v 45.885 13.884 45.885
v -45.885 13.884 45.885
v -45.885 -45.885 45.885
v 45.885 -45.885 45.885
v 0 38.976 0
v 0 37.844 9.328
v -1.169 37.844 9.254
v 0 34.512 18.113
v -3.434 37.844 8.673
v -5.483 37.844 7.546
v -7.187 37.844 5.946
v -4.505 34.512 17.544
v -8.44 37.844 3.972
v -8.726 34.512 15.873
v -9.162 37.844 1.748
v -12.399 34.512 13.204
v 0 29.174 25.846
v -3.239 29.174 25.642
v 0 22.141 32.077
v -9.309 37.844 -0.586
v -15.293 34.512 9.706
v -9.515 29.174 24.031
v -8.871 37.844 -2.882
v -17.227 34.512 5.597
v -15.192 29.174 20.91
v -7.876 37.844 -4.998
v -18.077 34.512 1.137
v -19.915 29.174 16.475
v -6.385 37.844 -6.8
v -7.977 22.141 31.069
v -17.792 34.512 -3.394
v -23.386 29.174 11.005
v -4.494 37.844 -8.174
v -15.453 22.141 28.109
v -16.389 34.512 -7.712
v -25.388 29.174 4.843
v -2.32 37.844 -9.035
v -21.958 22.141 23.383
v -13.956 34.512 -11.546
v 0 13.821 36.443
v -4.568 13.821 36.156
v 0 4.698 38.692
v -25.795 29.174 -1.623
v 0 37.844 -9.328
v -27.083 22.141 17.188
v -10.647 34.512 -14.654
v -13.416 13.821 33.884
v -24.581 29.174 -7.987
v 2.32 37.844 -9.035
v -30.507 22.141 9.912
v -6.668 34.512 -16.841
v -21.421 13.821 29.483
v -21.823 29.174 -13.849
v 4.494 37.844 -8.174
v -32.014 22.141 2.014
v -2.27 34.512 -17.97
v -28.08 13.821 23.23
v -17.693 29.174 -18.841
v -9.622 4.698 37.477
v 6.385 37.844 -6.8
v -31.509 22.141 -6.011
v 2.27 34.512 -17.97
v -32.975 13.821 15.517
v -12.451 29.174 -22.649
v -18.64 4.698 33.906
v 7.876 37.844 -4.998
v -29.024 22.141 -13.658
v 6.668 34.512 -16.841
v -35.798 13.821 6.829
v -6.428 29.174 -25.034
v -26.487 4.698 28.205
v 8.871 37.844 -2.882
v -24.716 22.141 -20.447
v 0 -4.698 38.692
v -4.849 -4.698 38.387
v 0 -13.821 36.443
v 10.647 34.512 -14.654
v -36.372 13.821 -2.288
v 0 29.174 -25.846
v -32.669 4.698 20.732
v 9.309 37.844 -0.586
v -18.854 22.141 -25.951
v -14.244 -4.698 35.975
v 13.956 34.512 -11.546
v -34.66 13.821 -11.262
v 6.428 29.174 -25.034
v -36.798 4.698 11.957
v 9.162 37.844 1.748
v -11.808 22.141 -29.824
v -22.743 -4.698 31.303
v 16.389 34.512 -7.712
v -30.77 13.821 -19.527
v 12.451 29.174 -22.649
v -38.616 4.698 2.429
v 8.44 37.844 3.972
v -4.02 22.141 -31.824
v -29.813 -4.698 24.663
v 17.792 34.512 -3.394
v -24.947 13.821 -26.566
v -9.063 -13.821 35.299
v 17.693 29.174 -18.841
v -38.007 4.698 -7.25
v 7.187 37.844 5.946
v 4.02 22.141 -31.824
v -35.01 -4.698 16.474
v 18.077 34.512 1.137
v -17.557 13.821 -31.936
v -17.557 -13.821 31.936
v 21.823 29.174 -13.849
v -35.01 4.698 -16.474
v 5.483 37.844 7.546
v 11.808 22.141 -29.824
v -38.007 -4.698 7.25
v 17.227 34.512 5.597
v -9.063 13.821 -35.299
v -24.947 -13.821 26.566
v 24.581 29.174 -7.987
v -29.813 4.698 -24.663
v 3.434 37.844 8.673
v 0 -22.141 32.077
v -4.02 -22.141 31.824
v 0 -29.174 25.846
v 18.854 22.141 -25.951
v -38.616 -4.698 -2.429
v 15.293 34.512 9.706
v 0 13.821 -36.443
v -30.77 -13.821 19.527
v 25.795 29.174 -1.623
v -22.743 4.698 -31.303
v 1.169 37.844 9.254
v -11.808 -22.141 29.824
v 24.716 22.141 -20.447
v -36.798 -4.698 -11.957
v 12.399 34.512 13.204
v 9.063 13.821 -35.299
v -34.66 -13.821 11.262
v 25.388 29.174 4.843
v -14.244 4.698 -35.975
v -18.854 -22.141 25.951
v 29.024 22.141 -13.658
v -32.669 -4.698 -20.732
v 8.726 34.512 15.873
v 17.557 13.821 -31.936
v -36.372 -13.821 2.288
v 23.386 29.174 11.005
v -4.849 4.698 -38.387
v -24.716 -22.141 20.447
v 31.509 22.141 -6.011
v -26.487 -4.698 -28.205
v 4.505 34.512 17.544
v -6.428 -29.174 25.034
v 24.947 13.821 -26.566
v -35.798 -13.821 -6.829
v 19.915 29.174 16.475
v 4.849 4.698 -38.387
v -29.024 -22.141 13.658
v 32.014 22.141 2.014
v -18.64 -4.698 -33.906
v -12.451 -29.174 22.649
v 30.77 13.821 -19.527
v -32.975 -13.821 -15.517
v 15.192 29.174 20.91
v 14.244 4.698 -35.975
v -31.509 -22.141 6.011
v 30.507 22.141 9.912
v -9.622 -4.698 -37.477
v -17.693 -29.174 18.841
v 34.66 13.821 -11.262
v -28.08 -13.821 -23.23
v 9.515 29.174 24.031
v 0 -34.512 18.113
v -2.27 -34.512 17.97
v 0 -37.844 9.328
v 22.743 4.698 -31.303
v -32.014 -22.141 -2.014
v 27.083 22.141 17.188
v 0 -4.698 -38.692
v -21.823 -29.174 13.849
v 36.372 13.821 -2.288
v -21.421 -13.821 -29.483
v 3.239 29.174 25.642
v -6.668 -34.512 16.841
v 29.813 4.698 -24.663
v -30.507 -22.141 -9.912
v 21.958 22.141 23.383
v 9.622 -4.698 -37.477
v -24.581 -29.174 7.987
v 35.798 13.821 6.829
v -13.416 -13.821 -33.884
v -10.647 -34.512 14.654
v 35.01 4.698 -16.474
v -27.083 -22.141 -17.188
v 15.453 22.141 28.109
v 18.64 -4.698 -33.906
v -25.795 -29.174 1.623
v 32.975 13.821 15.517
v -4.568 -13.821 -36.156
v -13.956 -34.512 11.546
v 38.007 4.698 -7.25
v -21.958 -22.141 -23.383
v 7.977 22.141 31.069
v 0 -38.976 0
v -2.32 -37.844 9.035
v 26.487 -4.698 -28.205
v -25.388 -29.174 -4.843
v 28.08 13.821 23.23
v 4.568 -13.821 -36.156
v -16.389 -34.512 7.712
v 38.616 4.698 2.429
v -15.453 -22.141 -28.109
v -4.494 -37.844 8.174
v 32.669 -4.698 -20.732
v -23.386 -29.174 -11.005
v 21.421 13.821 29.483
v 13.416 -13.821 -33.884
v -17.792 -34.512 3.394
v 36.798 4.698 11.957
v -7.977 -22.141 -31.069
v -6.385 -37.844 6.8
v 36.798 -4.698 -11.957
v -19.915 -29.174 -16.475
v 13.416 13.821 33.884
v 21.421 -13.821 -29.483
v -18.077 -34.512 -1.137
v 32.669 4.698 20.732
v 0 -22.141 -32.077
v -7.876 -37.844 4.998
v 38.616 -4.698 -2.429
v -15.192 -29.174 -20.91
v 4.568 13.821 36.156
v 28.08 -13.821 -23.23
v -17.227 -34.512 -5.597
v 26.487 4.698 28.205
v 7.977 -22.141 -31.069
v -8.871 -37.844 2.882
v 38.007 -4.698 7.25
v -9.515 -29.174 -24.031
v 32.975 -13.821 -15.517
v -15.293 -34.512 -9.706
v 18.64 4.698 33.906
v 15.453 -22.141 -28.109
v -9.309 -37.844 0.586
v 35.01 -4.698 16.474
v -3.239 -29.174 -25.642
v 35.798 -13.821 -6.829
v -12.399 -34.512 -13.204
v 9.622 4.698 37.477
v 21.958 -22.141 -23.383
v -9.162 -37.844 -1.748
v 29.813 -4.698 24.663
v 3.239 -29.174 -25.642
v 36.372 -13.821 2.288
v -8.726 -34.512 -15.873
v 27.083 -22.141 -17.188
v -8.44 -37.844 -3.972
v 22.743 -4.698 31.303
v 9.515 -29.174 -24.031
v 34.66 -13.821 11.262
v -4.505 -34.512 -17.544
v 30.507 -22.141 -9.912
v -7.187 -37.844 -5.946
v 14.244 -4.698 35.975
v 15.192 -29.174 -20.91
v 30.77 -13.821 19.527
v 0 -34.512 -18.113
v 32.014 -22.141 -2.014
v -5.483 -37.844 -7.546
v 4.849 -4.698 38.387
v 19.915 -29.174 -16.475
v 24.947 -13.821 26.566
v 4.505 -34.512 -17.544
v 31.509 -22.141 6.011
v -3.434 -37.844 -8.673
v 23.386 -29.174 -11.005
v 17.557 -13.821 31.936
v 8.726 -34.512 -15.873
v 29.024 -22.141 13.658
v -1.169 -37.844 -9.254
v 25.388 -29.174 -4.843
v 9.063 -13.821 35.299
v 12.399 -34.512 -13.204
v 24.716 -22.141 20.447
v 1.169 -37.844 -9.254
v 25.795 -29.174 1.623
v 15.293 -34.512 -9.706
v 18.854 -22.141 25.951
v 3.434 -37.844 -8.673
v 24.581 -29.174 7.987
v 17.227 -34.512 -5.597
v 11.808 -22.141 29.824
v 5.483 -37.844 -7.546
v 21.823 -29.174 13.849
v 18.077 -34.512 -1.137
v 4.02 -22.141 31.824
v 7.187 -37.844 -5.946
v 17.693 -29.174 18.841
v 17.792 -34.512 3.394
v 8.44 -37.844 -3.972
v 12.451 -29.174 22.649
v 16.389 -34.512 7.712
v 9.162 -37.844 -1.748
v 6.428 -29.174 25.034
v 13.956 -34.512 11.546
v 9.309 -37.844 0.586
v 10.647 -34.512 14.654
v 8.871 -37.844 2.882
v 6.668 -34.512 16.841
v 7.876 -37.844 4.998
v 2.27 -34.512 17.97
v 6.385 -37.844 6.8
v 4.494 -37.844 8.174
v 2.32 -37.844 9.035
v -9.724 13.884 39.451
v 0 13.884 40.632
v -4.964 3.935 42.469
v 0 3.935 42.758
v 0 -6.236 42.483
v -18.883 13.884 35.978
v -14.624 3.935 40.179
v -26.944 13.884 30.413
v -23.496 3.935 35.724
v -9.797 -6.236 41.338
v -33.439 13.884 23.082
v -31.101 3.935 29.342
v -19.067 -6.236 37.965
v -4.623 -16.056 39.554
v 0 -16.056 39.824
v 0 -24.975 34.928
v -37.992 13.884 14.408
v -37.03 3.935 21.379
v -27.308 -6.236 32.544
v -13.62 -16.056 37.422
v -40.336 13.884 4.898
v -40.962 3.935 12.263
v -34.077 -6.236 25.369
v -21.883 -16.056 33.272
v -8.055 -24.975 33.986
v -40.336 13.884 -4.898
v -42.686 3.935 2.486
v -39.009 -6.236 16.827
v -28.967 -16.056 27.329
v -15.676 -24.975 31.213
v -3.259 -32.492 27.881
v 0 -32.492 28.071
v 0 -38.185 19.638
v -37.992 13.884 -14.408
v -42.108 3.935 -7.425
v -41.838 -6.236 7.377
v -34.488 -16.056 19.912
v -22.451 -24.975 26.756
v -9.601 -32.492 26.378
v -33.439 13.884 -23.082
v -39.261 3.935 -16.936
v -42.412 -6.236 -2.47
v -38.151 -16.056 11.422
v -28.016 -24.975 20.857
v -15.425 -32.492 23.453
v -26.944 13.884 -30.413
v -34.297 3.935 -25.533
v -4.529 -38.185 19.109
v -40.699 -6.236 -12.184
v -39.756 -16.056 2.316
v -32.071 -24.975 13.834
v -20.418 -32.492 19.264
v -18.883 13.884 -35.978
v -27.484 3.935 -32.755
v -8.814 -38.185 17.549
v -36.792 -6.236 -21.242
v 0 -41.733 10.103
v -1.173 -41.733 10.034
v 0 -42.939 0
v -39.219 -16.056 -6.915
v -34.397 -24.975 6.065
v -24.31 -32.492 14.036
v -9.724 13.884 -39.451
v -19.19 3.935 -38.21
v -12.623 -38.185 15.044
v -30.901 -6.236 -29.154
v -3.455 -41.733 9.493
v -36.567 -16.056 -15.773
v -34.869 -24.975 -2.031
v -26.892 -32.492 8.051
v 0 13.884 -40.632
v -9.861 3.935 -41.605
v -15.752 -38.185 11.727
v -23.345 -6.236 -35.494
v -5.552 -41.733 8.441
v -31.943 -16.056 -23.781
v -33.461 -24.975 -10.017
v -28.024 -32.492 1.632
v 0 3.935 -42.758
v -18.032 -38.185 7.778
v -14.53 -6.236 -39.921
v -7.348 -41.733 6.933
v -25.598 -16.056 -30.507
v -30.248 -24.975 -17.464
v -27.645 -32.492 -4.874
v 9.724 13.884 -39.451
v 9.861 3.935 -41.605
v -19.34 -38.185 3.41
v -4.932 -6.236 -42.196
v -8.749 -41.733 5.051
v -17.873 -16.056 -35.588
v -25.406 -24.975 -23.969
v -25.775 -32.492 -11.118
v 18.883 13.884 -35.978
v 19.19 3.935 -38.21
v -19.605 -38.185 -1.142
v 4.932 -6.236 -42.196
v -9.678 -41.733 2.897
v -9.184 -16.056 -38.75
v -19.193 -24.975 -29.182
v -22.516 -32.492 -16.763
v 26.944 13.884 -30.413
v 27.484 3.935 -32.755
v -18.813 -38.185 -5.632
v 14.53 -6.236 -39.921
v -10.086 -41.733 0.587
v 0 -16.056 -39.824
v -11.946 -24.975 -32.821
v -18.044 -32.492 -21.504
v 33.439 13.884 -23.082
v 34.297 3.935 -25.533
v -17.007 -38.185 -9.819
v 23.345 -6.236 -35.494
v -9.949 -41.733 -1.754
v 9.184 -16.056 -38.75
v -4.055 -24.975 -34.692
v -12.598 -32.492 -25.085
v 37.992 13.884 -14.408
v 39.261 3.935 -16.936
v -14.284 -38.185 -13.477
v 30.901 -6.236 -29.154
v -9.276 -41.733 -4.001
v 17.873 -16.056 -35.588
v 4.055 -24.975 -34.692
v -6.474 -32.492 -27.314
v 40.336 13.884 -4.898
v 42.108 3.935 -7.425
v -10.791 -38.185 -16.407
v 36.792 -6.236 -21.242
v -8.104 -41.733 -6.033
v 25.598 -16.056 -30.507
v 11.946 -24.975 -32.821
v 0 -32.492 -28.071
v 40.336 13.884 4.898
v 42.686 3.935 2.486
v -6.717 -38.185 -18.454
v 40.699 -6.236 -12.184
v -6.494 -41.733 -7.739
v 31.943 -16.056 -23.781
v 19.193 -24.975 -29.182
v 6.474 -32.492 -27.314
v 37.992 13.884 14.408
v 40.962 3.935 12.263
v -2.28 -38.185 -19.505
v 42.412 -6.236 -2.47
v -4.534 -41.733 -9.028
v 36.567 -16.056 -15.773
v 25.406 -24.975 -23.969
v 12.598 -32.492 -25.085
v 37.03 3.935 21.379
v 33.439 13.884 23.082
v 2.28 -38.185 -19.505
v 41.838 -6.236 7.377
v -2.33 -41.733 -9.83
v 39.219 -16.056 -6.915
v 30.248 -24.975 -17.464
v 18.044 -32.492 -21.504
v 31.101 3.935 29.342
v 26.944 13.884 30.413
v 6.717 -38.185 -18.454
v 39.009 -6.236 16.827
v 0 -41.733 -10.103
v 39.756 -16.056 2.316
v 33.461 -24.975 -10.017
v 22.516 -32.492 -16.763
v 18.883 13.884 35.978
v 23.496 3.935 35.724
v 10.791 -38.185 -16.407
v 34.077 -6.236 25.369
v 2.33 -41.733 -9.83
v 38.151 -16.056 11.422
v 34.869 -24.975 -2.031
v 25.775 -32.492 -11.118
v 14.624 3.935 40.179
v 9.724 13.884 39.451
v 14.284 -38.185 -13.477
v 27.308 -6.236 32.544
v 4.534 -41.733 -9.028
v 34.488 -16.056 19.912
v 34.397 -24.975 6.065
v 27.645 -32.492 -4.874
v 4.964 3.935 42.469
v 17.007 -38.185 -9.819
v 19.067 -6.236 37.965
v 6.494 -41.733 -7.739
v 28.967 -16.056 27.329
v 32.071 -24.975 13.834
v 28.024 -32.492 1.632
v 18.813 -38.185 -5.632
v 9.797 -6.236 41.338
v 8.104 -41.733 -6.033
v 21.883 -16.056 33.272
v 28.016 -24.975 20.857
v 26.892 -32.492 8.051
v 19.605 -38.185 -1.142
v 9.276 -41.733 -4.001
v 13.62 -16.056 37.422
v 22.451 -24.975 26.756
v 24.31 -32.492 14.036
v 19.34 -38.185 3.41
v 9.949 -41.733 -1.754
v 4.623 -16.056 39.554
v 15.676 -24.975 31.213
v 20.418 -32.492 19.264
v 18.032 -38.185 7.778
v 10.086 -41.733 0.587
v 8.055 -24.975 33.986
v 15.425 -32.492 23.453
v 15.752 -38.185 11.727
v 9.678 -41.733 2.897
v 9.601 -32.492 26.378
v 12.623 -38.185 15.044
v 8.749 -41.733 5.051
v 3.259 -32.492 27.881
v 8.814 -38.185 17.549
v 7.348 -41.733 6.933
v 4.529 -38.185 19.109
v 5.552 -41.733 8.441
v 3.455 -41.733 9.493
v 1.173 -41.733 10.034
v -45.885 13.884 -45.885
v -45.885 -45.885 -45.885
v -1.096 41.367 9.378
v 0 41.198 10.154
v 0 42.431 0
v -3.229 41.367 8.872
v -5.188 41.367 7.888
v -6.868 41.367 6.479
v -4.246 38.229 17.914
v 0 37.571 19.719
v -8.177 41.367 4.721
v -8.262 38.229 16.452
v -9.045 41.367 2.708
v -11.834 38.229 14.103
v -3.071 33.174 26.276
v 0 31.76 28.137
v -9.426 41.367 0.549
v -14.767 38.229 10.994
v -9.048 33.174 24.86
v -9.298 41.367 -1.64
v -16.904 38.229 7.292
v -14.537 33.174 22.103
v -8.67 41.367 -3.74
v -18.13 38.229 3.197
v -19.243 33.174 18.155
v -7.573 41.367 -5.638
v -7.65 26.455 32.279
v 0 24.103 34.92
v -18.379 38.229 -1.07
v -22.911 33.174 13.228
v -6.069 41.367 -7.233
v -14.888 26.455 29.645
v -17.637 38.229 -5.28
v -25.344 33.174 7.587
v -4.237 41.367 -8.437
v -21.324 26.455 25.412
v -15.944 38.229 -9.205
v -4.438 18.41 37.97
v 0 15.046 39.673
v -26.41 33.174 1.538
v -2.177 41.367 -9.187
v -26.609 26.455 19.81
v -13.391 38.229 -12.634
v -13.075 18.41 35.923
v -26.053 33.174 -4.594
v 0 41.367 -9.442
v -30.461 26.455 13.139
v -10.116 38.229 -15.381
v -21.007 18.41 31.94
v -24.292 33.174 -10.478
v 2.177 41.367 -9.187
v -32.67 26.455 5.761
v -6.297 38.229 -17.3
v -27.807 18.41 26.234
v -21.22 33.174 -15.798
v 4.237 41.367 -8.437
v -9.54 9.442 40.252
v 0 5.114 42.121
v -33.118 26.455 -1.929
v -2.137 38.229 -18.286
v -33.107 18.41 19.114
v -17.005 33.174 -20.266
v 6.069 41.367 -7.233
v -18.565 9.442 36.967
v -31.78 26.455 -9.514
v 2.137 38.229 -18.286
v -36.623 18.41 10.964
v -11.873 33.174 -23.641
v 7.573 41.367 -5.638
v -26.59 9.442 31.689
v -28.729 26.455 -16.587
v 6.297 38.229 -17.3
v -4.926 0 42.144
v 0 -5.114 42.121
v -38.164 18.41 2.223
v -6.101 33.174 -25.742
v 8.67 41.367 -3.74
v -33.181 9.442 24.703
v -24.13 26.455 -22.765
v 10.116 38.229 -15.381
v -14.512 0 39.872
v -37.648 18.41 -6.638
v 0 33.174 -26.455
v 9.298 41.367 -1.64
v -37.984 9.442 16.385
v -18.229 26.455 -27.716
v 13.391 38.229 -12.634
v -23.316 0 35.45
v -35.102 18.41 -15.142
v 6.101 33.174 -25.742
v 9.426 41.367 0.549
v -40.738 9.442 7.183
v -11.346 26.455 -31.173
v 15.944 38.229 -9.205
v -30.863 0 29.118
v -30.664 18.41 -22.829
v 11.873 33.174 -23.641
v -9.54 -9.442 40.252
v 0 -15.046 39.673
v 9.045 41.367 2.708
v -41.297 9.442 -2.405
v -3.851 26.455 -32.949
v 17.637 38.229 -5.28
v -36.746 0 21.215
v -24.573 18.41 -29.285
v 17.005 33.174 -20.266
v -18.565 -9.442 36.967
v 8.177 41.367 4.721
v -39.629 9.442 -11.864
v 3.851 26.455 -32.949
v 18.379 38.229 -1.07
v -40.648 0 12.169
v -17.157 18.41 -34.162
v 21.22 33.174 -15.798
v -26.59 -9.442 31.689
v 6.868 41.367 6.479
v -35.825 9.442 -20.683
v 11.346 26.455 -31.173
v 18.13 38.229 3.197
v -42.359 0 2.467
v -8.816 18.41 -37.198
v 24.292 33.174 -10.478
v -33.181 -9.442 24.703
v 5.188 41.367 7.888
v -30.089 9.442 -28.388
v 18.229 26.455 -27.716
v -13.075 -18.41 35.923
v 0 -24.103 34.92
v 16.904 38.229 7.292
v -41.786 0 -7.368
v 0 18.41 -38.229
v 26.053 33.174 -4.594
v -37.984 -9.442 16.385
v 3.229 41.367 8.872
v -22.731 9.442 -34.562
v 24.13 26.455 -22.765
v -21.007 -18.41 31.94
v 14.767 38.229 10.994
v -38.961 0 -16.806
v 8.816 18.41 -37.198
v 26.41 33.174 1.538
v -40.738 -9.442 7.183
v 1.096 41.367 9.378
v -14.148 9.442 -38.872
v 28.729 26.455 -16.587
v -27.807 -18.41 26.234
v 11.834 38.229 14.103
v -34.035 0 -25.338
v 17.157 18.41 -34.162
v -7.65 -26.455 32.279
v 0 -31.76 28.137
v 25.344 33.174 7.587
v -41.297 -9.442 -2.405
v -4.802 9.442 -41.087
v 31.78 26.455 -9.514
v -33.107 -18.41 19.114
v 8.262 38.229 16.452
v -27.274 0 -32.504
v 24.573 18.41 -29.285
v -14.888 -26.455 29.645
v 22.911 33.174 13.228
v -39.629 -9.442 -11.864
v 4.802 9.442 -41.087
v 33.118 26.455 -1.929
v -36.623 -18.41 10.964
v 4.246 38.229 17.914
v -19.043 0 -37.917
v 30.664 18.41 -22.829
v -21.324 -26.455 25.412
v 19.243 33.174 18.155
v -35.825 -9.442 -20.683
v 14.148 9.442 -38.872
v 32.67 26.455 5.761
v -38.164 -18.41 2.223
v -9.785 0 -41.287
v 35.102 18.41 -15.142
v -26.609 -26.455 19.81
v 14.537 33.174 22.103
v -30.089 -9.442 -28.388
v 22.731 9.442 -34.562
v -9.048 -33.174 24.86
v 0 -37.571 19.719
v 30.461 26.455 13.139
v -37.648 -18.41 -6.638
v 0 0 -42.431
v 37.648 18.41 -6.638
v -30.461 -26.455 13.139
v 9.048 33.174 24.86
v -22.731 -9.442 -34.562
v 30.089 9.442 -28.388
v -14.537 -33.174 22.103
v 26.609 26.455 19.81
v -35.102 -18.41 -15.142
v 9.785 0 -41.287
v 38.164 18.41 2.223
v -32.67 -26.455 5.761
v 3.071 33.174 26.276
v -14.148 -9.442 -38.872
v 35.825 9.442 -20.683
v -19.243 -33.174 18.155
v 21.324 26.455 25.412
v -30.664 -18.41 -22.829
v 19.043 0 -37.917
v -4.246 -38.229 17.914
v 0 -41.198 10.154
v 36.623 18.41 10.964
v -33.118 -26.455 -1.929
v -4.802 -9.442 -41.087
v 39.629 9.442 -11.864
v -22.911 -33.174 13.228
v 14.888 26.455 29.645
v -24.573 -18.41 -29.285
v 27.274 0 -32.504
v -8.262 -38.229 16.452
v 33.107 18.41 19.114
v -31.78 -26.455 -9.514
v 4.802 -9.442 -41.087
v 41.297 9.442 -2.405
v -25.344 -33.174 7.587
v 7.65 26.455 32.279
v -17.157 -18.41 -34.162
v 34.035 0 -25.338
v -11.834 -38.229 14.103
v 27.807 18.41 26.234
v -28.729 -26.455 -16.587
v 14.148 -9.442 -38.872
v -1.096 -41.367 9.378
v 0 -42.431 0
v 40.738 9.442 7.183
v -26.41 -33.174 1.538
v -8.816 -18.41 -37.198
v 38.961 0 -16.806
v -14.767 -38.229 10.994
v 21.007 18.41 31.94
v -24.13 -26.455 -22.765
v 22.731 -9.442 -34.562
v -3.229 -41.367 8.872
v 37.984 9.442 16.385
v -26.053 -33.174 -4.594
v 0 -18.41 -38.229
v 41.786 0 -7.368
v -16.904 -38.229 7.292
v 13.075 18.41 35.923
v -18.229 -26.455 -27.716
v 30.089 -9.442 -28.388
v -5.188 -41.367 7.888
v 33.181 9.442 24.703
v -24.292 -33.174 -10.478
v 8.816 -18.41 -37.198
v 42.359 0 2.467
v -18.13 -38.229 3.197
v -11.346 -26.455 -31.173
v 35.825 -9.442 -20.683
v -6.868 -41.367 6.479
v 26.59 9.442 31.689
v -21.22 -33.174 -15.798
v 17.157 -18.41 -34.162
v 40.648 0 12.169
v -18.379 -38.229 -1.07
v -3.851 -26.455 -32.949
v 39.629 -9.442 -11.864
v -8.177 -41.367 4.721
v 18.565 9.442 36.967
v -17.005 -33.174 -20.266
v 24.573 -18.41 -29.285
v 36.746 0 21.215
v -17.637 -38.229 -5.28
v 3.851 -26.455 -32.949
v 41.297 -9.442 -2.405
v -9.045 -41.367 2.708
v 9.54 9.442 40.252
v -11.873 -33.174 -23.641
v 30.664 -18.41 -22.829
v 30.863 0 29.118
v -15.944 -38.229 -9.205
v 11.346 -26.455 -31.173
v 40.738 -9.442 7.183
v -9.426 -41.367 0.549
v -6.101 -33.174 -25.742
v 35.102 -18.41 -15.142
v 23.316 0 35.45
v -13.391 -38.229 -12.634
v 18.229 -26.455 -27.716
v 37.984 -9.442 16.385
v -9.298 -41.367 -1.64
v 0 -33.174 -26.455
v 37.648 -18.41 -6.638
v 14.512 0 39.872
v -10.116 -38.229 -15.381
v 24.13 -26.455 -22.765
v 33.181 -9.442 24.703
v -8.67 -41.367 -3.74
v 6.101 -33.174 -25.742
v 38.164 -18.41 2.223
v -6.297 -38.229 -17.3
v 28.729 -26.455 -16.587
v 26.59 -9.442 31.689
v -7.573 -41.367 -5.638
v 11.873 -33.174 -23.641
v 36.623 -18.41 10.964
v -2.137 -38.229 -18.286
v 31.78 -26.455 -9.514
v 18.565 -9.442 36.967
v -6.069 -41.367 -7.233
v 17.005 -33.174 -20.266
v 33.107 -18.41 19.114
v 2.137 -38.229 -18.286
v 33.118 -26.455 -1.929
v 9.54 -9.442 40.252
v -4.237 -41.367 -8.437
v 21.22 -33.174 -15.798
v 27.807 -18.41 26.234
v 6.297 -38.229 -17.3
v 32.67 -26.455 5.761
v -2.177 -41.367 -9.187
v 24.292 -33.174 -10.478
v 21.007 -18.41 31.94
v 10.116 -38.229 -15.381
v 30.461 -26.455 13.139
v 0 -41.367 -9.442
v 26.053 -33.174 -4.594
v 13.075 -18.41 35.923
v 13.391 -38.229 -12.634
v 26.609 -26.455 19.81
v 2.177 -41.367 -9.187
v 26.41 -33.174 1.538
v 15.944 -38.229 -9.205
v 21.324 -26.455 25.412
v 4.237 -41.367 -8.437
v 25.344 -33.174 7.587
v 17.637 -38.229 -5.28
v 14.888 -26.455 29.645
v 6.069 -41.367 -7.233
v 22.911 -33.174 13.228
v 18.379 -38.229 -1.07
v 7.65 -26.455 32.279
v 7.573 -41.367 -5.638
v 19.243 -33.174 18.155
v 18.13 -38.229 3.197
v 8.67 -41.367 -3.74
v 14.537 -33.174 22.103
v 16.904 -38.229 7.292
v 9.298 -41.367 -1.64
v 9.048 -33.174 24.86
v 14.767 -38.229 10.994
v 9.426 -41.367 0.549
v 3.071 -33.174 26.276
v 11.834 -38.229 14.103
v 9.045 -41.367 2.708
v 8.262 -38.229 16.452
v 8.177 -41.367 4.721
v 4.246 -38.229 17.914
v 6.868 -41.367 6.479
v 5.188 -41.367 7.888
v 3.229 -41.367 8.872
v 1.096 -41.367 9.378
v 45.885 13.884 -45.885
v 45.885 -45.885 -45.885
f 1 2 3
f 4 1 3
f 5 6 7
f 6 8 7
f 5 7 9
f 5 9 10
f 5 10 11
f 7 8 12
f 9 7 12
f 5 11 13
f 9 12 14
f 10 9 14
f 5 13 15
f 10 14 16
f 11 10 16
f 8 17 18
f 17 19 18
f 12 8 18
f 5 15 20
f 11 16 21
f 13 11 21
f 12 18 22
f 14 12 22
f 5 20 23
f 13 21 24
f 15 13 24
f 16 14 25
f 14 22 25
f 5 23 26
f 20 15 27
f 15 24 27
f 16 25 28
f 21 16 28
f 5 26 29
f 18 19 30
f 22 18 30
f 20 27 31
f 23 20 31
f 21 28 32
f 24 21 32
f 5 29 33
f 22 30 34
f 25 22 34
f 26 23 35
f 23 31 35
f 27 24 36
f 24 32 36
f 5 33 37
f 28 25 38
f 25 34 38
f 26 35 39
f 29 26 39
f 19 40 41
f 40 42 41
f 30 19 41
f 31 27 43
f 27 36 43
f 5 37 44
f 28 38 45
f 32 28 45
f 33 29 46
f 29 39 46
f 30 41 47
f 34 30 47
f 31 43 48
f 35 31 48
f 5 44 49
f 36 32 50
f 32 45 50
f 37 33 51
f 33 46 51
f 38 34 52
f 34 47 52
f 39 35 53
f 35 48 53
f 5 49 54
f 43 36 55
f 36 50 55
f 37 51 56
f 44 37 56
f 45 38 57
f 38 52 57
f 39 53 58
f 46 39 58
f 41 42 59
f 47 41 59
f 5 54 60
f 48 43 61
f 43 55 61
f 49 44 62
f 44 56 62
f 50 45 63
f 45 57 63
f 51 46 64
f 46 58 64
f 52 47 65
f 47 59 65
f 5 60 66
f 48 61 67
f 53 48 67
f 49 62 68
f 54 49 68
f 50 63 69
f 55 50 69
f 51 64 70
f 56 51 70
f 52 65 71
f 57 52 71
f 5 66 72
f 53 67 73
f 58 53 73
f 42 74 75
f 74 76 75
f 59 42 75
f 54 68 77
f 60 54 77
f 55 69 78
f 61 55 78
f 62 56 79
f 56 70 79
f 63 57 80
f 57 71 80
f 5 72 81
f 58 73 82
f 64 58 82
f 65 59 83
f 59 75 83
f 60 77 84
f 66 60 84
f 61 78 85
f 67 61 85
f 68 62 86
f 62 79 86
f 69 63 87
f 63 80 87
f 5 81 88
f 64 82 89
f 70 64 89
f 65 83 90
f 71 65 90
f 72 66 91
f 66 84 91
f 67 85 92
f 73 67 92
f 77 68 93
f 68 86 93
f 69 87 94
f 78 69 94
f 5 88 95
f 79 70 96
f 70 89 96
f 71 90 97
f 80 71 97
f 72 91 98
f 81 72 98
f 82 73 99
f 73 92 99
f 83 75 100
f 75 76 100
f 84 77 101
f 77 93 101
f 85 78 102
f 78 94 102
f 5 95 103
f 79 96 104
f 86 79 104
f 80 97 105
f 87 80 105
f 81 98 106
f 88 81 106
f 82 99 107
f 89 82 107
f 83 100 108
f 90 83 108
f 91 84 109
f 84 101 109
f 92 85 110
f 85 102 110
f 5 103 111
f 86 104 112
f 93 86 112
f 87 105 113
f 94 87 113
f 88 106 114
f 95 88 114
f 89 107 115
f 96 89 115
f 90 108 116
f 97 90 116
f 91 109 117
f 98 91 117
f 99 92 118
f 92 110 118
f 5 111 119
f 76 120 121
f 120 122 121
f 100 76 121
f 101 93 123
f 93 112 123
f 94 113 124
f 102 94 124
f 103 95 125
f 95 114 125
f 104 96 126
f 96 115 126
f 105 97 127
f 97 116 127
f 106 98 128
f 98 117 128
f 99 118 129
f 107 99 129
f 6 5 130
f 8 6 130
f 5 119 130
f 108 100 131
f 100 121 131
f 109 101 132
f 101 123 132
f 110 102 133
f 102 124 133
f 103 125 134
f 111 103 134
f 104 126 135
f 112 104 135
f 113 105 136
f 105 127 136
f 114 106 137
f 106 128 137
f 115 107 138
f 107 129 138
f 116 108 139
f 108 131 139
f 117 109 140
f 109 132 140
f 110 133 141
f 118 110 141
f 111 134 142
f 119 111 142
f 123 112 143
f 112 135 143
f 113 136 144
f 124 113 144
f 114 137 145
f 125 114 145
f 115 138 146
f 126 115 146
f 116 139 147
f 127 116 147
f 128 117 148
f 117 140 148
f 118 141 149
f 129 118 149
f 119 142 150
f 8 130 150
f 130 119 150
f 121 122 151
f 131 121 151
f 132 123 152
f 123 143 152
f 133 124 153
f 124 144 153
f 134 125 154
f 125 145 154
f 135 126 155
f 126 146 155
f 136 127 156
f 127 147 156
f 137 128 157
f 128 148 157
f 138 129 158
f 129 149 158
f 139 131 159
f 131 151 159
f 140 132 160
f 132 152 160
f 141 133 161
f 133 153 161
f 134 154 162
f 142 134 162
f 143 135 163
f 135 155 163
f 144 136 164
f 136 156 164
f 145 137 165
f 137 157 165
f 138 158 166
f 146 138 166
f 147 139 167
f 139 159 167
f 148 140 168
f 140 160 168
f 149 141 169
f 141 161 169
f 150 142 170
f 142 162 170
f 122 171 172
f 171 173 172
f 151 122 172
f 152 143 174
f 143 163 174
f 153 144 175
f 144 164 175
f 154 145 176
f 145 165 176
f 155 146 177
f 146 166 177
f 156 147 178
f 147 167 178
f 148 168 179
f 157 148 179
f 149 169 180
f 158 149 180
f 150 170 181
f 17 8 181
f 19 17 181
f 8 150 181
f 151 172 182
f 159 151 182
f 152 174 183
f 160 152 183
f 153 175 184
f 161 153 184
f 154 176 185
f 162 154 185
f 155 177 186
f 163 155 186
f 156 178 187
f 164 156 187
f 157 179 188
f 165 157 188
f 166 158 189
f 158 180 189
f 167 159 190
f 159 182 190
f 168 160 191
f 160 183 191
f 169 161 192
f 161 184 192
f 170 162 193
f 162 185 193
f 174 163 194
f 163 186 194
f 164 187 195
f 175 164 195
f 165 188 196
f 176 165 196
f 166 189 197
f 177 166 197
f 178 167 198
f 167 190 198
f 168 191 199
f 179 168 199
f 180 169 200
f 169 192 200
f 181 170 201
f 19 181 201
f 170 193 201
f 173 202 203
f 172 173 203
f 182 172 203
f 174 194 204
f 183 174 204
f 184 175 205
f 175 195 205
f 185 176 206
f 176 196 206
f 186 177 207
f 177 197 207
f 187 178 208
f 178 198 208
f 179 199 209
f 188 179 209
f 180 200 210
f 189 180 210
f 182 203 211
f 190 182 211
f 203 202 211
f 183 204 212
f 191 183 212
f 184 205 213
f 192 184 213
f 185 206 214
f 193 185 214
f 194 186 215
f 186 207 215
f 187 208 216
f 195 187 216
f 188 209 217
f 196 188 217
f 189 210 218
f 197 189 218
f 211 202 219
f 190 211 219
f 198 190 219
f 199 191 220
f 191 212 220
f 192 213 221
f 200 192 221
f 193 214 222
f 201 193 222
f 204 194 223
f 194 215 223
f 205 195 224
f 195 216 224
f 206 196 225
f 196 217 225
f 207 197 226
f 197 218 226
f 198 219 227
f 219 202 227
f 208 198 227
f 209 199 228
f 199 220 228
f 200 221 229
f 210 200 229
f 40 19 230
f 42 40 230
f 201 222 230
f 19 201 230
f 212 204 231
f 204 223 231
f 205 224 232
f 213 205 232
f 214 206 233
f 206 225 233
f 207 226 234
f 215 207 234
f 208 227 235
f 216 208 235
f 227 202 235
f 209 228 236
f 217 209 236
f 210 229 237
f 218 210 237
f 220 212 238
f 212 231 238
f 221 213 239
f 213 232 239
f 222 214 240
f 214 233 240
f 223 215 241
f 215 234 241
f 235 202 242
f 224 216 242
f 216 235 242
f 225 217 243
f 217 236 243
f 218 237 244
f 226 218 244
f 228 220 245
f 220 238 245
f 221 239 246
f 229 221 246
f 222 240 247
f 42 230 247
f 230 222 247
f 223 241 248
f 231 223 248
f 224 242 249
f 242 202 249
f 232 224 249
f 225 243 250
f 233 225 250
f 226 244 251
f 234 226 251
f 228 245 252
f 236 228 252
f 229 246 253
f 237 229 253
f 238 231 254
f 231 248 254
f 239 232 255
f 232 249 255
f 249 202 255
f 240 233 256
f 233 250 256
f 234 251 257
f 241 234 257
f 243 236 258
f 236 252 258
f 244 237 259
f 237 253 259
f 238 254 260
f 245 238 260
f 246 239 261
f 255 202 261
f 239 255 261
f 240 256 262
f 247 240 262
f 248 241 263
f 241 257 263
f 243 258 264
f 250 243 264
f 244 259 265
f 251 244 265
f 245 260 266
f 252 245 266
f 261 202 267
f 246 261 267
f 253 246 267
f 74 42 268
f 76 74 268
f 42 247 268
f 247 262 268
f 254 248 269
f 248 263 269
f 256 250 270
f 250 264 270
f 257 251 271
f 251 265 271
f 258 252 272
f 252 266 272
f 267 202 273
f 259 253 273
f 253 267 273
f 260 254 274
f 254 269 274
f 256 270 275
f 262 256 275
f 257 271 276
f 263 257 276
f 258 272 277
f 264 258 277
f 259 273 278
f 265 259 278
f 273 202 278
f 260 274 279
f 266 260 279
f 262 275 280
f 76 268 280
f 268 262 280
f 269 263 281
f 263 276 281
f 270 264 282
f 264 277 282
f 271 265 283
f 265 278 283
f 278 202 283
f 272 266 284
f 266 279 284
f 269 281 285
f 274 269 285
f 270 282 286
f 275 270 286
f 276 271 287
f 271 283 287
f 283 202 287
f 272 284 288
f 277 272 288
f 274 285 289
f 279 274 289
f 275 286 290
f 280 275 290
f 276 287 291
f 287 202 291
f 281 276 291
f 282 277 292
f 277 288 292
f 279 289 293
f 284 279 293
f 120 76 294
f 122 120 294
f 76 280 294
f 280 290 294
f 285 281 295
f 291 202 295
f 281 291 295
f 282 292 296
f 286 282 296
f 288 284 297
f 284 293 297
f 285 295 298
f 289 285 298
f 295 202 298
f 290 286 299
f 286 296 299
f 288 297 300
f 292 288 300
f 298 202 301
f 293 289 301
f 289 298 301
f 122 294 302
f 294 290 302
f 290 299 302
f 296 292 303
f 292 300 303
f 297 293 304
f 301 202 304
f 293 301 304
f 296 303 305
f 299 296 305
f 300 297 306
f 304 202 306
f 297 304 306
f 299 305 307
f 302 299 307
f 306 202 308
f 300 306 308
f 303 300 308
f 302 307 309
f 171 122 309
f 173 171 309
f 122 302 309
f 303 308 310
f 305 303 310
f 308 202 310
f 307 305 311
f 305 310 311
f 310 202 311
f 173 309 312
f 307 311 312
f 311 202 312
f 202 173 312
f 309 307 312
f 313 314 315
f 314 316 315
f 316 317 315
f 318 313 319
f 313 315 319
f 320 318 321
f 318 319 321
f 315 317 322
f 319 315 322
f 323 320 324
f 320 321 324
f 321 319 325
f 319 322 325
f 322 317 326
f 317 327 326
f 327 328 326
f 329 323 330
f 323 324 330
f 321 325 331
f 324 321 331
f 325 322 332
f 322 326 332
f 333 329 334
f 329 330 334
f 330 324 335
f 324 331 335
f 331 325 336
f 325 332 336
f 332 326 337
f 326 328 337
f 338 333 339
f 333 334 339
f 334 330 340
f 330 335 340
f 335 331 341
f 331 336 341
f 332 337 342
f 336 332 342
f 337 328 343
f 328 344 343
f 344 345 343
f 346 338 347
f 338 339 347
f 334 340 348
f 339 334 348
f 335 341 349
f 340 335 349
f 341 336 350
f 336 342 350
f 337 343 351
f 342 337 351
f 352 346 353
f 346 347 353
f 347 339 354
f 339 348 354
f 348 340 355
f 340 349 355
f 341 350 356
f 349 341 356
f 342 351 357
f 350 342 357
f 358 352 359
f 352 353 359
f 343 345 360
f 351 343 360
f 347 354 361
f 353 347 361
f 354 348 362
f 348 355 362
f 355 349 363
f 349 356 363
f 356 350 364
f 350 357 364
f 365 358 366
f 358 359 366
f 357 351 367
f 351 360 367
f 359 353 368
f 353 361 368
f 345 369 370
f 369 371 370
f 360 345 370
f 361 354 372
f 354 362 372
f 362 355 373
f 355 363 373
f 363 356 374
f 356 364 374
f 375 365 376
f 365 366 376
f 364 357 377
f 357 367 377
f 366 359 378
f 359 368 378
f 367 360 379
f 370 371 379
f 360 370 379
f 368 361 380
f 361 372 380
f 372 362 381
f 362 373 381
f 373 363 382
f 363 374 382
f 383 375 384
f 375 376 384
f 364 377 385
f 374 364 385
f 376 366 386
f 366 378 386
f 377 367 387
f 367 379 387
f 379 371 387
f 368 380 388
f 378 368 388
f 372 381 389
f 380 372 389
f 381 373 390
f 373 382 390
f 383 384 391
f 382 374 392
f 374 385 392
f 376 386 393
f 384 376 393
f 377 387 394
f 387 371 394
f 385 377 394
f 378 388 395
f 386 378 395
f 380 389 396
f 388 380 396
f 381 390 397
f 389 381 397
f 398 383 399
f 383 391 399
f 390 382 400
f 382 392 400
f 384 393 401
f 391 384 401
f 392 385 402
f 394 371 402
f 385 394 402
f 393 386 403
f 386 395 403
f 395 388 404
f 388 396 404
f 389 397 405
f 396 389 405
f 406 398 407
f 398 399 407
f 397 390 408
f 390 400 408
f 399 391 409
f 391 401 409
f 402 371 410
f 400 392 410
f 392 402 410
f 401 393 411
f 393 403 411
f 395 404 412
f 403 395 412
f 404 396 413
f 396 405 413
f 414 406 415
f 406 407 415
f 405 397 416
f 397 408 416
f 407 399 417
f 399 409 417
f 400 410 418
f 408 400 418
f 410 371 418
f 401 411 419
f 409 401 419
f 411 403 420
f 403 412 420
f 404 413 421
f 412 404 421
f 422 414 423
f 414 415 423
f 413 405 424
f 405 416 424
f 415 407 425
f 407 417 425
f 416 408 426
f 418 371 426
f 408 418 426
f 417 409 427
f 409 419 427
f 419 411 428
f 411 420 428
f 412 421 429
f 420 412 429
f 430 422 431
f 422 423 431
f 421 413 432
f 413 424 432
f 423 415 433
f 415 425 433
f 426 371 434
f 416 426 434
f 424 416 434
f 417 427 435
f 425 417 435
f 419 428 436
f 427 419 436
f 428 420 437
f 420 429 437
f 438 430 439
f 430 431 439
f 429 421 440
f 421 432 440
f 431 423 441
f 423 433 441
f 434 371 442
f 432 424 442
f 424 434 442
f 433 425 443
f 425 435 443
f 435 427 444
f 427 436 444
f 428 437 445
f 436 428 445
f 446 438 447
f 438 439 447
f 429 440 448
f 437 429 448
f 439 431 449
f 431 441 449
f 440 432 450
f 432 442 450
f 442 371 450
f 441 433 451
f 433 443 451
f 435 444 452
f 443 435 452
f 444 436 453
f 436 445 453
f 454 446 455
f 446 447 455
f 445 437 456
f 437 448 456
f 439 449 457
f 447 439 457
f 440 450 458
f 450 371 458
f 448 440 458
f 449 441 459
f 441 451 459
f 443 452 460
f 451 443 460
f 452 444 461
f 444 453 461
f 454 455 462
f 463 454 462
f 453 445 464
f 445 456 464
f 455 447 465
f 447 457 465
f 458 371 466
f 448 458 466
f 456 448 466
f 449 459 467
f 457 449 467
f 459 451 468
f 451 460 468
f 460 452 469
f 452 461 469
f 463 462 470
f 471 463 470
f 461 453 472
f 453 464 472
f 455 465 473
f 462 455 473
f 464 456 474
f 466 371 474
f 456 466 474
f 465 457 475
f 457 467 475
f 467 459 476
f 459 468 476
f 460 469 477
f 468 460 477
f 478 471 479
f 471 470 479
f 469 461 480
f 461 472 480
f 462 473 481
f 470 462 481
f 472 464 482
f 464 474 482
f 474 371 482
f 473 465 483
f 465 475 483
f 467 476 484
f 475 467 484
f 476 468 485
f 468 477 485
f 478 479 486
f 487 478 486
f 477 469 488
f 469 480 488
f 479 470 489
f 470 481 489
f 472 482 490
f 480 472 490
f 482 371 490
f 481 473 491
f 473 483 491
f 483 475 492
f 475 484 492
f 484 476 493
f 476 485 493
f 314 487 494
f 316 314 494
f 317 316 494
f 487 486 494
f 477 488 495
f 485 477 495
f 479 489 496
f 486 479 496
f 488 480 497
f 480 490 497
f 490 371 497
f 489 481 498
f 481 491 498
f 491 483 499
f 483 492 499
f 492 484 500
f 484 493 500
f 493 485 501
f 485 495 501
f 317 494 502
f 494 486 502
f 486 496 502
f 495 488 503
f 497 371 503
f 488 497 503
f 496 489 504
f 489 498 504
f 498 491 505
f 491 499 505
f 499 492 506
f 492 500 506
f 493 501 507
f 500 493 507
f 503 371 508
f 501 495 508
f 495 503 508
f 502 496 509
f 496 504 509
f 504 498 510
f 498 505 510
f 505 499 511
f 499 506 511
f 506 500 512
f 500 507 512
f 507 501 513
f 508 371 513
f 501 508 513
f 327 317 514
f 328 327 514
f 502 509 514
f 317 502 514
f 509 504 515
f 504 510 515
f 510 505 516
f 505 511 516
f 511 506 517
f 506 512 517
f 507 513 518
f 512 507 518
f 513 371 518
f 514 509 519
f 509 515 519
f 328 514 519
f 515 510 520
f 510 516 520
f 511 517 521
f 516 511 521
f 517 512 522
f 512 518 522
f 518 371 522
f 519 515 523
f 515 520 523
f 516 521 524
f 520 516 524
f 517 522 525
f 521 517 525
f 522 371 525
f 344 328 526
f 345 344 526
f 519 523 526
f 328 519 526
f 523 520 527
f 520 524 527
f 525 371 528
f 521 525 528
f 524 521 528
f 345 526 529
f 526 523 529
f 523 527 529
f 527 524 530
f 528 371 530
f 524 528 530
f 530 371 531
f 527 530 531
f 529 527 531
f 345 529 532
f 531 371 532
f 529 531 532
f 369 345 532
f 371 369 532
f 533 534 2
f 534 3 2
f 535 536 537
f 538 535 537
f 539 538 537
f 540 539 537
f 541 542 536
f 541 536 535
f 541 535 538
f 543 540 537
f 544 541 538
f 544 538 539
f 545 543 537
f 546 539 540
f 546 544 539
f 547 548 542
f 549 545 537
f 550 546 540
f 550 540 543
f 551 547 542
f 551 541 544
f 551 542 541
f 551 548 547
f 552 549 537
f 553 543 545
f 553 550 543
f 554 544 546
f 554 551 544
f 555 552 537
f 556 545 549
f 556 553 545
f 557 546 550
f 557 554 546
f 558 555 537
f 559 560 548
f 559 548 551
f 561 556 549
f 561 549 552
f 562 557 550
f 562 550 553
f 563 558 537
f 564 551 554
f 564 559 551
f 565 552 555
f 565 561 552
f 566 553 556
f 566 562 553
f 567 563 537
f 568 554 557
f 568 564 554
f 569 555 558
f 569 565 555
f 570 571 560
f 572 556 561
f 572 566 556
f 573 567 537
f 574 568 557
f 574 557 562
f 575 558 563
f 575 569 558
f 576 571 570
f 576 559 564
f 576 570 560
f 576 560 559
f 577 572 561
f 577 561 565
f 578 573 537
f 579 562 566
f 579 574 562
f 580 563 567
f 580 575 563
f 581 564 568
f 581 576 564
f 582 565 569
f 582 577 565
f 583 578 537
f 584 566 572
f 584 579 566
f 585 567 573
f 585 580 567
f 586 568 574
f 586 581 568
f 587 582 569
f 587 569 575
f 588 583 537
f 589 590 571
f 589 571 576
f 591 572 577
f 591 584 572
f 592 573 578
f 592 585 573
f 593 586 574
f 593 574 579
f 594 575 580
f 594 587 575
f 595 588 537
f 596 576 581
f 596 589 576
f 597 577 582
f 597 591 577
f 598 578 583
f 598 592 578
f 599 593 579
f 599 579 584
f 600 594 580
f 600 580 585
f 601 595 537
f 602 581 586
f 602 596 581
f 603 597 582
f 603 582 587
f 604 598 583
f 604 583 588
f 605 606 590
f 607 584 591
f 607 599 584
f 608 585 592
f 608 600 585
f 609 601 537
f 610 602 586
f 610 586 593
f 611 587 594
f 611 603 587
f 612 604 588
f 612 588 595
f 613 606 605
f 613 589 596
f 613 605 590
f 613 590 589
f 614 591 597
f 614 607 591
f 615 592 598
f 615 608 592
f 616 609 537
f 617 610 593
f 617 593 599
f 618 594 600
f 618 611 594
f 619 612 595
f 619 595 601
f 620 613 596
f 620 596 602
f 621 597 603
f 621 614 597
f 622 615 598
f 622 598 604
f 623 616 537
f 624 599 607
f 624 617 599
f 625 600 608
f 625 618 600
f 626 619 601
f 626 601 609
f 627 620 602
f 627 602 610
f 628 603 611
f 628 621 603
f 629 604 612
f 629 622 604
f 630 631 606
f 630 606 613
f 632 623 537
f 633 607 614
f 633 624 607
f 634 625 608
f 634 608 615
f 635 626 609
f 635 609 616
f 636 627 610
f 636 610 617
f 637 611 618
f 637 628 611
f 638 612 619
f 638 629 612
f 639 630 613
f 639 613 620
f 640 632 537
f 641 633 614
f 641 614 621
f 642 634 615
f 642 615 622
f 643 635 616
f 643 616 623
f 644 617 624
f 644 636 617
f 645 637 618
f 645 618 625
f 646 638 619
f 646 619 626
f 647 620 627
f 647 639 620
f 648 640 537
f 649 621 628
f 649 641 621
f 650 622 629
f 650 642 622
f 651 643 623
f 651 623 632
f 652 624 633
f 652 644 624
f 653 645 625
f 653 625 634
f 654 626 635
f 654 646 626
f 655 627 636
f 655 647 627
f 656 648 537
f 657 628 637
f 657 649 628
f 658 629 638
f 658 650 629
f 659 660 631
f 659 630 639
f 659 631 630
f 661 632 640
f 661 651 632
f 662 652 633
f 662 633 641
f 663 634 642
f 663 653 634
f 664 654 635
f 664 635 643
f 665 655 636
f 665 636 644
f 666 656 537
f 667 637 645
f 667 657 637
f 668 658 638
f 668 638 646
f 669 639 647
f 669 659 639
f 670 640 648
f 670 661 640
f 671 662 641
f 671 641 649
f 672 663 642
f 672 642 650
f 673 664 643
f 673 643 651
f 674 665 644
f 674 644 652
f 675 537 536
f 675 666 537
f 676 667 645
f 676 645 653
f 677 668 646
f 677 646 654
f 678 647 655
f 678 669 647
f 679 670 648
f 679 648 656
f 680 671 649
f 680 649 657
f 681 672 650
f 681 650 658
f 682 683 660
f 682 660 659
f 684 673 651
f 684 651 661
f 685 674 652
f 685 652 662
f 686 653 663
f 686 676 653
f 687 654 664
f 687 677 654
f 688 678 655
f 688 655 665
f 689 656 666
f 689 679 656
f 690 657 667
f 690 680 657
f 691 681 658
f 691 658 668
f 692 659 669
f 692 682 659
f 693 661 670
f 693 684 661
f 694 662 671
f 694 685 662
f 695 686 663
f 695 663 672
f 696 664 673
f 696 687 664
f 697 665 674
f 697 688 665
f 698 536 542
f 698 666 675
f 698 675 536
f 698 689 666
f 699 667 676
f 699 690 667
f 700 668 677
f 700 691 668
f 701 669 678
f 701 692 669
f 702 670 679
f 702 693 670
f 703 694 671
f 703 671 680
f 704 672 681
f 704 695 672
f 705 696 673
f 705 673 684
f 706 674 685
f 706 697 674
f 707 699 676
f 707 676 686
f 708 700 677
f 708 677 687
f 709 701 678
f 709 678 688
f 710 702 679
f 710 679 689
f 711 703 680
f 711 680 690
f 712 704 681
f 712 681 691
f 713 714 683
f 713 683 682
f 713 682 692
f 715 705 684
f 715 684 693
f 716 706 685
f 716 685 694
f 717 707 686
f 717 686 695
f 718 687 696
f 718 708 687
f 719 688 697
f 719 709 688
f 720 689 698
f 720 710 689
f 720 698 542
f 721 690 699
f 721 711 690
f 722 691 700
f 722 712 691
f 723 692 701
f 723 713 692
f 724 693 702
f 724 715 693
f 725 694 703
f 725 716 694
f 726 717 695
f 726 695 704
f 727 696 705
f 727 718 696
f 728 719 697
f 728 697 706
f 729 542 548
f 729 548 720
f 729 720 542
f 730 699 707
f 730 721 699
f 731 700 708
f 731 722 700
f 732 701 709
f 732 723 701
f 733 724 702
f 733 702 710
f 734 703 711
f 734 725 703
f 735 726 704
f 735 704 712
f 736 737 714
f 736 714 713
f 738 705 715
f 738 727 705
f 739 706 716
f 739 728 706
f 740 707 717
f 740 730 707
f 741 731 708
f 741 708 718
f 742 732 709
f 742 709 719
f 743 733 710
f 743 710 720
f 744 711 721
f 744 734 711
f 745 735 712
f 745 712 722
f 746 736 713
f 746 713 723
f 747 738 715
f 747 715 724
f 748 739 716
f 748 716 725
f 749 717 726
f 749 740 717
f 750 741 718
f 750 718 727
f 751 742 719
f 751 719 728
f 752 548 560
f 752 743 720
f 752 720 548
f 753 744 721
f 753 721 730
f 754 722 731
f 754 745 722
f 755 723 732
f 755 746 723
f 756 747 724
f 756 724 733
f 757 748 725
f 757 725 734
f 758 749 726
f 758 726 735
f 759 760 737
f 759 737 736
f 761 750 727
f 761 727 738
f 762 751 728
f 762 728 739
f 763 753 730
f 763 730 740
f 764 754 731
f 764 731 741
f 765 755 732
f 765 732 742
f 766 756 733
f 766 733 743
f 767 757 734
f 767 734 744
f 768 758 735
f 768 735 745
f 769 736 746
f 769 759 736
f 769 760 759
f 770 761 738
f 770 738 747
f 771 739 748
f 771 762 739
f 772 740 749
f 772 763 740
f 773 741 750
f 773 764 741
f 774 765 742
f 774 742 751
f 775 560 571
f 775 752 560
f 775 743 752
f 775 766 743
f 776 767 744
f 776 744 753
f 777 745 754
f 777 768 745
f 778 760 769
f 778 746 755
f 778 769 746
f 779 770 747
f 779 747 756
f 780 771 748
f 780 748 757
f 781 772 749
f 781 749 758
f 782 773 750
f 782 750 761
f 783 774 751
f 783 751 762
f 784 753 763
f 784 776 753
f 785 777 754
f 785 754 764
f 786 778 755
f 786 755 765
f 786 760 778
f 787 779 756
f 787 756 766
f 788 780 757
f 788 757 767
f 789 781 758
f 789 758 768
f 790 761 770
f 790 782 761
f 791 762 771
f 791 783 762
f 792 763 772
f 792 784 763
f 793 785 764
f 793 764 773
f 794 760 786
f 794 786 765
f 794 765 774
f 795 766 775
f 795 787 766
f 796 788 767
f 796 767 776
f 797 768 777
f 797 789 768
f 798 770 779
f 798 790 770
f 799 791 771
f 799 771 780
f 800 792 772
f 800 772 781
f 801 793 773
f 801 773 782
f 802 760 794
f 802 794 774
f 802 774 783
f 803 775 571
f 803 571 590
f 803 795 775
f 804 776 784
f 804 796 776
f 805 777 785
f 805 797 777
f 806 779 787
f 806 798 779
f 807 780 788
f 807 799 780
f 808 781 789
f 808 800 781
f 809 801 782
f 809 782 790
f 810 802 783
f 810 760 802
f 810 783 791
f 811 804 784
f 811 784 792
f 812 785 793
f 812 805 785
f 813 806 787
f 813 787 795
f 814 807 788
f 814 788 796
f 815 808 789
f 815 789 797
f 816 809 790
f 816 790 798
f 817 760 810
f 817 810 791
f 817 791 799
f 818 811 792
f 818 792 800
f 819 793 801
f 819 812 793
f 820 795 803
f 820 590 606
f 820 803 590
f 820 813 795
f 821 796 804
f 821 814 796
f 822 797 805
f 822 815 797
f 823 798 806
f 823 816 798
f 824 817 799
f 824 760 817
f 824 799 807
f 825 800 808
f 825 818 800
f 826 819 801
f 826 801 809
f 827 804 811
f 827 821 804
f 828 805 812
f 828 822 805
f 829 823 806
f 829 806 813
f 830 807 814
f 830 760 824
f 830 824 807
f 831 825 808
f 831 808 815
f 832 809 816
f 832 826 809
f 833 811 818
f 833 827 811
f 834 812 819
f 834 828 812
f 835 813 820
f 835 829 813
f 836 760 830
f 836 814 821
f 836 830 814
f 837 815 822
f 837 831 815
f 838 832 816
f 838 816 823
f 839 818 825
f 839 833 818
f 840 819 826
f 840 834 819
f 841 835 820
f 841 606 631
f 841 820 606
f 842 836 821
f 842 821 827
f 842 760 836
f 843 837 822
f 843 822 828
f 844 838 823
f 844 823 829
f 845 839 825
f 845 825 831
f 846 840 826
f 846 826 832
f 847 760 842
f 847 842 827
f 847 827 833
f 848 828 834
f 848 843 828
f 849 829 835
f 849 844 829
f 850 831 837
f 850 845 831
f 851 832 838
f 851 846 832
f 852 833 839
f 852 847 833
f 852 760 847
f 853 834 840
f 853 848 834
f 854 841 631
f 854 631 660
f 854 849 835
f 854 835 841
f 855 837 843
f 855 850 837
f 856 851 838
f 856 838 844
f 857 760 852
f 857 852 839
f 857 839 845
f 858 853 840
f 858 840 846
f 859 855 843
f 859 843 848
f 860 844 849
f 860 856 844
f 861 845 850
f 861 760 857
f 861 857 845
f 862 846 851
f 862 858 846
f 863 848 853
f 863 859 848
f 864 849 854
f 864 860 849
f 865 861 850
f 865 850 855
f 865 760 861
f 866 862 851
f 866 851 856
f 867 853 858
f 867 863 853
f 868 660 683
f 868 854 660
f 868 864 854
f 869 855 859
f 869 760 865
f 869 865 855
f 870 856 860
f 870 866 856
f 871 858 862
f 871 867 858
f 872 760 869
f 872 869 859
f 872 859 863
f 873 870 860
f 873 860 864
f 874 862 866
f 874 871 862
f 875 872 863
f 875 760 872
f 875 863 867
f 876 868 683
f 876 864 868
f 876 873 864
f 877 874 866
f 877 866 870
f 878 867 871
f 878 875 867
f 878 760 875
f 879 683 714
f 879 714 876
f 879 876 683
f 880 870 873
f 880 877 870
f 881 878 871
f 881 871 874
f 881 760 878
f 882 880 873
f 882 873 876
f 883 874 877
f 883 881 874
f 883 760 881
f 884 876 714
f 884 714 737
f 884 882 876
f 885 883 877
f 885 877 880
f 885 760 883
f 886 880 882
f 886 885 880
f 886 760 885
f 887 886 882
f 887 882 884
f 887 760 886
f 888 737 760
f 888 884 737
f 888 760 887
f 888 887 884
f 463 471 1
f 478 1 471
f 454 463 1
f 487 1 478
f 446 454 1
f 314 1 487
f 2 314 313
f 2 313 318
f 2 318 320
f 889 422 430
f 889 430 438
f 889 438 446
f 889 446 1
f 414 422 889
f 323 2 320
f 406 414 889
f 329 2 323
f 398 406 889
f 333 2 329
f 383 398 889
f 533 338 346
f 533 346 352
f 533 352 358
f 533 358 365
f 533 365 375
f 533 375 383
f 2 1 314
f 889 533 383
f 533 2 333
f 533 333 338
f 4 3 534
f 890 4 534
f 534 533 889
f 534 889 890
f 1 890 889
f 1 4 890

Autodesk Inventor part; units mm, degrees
ref_plane "YZ Plane" through (0, 0, 0) normal (1, 0, 0) x (0, 1, 0)
ref_plane "XZ Plane" through (0, 0, 0) normal (0, 1, 0) x (-1, 0, 0)
ref_plane "XY Plane" through (0, 0, 0) normal (0, 0, 1) x (1, 0, 0)
sketch "Sketch1" plane through (0, 0, 0) normal (1, 0, 0) x (0, 1, 0)
  arc A0 (38.9763, 0) -> (-38.9763, 0) centre (0, 0) ccw
  arc A1 (42.4307, 0) -> (-42.4307, 0) centre (0, 0) ccw
  line L0 (-45.8851, 0) -> (-45.8851, 45.8851)
  line L1 (13.8845, 45.8851) -> (-45.8851, 45.8851)
  line L2 (13.8845, 45.8851) -> (13.8845, 0)
  line L3 (-45.8851, 0) -> (-45.8851, -45.8851)
  line L4 (13.8845, -45.8851) -> (-45.8851, -45.8851)
  line L5 (13.8845, -45.8851) -> (13.8845, 0)
  line L6 (42.9387, 0) -> (42.4307, 0)
  line L7 (38.9763, 0) -> (42.4307, 0)
  line L8 (38.9763, 0) -> (-38.9763, 0)
  line L9 (-38.9763, 0) -> (-42.4307, 0)
  line L10 (-42.4307, 0) -> (-42.9387, 0)
  dimension "d0" = 77.9526
  dimension "d3" = 45.8851
  dimension "d4" = 45.8851
  dimension "d10" = 3.4544
  dimension "d19" = 91.7702
extrude "cube to cut from" add sketch "Sketch1" along normal mid plane 91.7702 contours L2 L8 A0 | A0 L9 A1 L2 | L5 L4 L3 L0 L1 L2 A1 L9 L8 picked at (-21.0569, 2.7719)
sketch "Sketch2" plane through (0, 0, 0) normal (1, 0, 0) x (0, 1, 0)
  arc A0 (42.9387, 0) -> (-42.9387, 0) centre (0, 0) ccw
  line L0 (42.9387, 0) -> (-42.9387, 0)
  dimension "d17" = 85.8774
revolve "cut out for mouse ball" cut sketch "Sketch2" angle 360 about axis through (0, 42.9387, 0) along (0, -1, 0)
revolve "mouse ball" add sketch "Sketch1" angle 360 about axis through (0, 38.9763, 0) along (0, -1, 0) separate body contours A0 L2 A1 L7 | A0 L9 A1 L2
equation "\"d3\" = 0.5 * d0 + 2 * d1"
equation "\"d4\" = 0.5 * d0 + 2 * d1"
equation "\"d8\" = d19"
equation "\"d17\" = 2 * d10 + d0 + 2 * d11"
equation "\"d1\" = 3.4544"
equation "\"d11\" = 0.508"
properties part number "mouse ball"
